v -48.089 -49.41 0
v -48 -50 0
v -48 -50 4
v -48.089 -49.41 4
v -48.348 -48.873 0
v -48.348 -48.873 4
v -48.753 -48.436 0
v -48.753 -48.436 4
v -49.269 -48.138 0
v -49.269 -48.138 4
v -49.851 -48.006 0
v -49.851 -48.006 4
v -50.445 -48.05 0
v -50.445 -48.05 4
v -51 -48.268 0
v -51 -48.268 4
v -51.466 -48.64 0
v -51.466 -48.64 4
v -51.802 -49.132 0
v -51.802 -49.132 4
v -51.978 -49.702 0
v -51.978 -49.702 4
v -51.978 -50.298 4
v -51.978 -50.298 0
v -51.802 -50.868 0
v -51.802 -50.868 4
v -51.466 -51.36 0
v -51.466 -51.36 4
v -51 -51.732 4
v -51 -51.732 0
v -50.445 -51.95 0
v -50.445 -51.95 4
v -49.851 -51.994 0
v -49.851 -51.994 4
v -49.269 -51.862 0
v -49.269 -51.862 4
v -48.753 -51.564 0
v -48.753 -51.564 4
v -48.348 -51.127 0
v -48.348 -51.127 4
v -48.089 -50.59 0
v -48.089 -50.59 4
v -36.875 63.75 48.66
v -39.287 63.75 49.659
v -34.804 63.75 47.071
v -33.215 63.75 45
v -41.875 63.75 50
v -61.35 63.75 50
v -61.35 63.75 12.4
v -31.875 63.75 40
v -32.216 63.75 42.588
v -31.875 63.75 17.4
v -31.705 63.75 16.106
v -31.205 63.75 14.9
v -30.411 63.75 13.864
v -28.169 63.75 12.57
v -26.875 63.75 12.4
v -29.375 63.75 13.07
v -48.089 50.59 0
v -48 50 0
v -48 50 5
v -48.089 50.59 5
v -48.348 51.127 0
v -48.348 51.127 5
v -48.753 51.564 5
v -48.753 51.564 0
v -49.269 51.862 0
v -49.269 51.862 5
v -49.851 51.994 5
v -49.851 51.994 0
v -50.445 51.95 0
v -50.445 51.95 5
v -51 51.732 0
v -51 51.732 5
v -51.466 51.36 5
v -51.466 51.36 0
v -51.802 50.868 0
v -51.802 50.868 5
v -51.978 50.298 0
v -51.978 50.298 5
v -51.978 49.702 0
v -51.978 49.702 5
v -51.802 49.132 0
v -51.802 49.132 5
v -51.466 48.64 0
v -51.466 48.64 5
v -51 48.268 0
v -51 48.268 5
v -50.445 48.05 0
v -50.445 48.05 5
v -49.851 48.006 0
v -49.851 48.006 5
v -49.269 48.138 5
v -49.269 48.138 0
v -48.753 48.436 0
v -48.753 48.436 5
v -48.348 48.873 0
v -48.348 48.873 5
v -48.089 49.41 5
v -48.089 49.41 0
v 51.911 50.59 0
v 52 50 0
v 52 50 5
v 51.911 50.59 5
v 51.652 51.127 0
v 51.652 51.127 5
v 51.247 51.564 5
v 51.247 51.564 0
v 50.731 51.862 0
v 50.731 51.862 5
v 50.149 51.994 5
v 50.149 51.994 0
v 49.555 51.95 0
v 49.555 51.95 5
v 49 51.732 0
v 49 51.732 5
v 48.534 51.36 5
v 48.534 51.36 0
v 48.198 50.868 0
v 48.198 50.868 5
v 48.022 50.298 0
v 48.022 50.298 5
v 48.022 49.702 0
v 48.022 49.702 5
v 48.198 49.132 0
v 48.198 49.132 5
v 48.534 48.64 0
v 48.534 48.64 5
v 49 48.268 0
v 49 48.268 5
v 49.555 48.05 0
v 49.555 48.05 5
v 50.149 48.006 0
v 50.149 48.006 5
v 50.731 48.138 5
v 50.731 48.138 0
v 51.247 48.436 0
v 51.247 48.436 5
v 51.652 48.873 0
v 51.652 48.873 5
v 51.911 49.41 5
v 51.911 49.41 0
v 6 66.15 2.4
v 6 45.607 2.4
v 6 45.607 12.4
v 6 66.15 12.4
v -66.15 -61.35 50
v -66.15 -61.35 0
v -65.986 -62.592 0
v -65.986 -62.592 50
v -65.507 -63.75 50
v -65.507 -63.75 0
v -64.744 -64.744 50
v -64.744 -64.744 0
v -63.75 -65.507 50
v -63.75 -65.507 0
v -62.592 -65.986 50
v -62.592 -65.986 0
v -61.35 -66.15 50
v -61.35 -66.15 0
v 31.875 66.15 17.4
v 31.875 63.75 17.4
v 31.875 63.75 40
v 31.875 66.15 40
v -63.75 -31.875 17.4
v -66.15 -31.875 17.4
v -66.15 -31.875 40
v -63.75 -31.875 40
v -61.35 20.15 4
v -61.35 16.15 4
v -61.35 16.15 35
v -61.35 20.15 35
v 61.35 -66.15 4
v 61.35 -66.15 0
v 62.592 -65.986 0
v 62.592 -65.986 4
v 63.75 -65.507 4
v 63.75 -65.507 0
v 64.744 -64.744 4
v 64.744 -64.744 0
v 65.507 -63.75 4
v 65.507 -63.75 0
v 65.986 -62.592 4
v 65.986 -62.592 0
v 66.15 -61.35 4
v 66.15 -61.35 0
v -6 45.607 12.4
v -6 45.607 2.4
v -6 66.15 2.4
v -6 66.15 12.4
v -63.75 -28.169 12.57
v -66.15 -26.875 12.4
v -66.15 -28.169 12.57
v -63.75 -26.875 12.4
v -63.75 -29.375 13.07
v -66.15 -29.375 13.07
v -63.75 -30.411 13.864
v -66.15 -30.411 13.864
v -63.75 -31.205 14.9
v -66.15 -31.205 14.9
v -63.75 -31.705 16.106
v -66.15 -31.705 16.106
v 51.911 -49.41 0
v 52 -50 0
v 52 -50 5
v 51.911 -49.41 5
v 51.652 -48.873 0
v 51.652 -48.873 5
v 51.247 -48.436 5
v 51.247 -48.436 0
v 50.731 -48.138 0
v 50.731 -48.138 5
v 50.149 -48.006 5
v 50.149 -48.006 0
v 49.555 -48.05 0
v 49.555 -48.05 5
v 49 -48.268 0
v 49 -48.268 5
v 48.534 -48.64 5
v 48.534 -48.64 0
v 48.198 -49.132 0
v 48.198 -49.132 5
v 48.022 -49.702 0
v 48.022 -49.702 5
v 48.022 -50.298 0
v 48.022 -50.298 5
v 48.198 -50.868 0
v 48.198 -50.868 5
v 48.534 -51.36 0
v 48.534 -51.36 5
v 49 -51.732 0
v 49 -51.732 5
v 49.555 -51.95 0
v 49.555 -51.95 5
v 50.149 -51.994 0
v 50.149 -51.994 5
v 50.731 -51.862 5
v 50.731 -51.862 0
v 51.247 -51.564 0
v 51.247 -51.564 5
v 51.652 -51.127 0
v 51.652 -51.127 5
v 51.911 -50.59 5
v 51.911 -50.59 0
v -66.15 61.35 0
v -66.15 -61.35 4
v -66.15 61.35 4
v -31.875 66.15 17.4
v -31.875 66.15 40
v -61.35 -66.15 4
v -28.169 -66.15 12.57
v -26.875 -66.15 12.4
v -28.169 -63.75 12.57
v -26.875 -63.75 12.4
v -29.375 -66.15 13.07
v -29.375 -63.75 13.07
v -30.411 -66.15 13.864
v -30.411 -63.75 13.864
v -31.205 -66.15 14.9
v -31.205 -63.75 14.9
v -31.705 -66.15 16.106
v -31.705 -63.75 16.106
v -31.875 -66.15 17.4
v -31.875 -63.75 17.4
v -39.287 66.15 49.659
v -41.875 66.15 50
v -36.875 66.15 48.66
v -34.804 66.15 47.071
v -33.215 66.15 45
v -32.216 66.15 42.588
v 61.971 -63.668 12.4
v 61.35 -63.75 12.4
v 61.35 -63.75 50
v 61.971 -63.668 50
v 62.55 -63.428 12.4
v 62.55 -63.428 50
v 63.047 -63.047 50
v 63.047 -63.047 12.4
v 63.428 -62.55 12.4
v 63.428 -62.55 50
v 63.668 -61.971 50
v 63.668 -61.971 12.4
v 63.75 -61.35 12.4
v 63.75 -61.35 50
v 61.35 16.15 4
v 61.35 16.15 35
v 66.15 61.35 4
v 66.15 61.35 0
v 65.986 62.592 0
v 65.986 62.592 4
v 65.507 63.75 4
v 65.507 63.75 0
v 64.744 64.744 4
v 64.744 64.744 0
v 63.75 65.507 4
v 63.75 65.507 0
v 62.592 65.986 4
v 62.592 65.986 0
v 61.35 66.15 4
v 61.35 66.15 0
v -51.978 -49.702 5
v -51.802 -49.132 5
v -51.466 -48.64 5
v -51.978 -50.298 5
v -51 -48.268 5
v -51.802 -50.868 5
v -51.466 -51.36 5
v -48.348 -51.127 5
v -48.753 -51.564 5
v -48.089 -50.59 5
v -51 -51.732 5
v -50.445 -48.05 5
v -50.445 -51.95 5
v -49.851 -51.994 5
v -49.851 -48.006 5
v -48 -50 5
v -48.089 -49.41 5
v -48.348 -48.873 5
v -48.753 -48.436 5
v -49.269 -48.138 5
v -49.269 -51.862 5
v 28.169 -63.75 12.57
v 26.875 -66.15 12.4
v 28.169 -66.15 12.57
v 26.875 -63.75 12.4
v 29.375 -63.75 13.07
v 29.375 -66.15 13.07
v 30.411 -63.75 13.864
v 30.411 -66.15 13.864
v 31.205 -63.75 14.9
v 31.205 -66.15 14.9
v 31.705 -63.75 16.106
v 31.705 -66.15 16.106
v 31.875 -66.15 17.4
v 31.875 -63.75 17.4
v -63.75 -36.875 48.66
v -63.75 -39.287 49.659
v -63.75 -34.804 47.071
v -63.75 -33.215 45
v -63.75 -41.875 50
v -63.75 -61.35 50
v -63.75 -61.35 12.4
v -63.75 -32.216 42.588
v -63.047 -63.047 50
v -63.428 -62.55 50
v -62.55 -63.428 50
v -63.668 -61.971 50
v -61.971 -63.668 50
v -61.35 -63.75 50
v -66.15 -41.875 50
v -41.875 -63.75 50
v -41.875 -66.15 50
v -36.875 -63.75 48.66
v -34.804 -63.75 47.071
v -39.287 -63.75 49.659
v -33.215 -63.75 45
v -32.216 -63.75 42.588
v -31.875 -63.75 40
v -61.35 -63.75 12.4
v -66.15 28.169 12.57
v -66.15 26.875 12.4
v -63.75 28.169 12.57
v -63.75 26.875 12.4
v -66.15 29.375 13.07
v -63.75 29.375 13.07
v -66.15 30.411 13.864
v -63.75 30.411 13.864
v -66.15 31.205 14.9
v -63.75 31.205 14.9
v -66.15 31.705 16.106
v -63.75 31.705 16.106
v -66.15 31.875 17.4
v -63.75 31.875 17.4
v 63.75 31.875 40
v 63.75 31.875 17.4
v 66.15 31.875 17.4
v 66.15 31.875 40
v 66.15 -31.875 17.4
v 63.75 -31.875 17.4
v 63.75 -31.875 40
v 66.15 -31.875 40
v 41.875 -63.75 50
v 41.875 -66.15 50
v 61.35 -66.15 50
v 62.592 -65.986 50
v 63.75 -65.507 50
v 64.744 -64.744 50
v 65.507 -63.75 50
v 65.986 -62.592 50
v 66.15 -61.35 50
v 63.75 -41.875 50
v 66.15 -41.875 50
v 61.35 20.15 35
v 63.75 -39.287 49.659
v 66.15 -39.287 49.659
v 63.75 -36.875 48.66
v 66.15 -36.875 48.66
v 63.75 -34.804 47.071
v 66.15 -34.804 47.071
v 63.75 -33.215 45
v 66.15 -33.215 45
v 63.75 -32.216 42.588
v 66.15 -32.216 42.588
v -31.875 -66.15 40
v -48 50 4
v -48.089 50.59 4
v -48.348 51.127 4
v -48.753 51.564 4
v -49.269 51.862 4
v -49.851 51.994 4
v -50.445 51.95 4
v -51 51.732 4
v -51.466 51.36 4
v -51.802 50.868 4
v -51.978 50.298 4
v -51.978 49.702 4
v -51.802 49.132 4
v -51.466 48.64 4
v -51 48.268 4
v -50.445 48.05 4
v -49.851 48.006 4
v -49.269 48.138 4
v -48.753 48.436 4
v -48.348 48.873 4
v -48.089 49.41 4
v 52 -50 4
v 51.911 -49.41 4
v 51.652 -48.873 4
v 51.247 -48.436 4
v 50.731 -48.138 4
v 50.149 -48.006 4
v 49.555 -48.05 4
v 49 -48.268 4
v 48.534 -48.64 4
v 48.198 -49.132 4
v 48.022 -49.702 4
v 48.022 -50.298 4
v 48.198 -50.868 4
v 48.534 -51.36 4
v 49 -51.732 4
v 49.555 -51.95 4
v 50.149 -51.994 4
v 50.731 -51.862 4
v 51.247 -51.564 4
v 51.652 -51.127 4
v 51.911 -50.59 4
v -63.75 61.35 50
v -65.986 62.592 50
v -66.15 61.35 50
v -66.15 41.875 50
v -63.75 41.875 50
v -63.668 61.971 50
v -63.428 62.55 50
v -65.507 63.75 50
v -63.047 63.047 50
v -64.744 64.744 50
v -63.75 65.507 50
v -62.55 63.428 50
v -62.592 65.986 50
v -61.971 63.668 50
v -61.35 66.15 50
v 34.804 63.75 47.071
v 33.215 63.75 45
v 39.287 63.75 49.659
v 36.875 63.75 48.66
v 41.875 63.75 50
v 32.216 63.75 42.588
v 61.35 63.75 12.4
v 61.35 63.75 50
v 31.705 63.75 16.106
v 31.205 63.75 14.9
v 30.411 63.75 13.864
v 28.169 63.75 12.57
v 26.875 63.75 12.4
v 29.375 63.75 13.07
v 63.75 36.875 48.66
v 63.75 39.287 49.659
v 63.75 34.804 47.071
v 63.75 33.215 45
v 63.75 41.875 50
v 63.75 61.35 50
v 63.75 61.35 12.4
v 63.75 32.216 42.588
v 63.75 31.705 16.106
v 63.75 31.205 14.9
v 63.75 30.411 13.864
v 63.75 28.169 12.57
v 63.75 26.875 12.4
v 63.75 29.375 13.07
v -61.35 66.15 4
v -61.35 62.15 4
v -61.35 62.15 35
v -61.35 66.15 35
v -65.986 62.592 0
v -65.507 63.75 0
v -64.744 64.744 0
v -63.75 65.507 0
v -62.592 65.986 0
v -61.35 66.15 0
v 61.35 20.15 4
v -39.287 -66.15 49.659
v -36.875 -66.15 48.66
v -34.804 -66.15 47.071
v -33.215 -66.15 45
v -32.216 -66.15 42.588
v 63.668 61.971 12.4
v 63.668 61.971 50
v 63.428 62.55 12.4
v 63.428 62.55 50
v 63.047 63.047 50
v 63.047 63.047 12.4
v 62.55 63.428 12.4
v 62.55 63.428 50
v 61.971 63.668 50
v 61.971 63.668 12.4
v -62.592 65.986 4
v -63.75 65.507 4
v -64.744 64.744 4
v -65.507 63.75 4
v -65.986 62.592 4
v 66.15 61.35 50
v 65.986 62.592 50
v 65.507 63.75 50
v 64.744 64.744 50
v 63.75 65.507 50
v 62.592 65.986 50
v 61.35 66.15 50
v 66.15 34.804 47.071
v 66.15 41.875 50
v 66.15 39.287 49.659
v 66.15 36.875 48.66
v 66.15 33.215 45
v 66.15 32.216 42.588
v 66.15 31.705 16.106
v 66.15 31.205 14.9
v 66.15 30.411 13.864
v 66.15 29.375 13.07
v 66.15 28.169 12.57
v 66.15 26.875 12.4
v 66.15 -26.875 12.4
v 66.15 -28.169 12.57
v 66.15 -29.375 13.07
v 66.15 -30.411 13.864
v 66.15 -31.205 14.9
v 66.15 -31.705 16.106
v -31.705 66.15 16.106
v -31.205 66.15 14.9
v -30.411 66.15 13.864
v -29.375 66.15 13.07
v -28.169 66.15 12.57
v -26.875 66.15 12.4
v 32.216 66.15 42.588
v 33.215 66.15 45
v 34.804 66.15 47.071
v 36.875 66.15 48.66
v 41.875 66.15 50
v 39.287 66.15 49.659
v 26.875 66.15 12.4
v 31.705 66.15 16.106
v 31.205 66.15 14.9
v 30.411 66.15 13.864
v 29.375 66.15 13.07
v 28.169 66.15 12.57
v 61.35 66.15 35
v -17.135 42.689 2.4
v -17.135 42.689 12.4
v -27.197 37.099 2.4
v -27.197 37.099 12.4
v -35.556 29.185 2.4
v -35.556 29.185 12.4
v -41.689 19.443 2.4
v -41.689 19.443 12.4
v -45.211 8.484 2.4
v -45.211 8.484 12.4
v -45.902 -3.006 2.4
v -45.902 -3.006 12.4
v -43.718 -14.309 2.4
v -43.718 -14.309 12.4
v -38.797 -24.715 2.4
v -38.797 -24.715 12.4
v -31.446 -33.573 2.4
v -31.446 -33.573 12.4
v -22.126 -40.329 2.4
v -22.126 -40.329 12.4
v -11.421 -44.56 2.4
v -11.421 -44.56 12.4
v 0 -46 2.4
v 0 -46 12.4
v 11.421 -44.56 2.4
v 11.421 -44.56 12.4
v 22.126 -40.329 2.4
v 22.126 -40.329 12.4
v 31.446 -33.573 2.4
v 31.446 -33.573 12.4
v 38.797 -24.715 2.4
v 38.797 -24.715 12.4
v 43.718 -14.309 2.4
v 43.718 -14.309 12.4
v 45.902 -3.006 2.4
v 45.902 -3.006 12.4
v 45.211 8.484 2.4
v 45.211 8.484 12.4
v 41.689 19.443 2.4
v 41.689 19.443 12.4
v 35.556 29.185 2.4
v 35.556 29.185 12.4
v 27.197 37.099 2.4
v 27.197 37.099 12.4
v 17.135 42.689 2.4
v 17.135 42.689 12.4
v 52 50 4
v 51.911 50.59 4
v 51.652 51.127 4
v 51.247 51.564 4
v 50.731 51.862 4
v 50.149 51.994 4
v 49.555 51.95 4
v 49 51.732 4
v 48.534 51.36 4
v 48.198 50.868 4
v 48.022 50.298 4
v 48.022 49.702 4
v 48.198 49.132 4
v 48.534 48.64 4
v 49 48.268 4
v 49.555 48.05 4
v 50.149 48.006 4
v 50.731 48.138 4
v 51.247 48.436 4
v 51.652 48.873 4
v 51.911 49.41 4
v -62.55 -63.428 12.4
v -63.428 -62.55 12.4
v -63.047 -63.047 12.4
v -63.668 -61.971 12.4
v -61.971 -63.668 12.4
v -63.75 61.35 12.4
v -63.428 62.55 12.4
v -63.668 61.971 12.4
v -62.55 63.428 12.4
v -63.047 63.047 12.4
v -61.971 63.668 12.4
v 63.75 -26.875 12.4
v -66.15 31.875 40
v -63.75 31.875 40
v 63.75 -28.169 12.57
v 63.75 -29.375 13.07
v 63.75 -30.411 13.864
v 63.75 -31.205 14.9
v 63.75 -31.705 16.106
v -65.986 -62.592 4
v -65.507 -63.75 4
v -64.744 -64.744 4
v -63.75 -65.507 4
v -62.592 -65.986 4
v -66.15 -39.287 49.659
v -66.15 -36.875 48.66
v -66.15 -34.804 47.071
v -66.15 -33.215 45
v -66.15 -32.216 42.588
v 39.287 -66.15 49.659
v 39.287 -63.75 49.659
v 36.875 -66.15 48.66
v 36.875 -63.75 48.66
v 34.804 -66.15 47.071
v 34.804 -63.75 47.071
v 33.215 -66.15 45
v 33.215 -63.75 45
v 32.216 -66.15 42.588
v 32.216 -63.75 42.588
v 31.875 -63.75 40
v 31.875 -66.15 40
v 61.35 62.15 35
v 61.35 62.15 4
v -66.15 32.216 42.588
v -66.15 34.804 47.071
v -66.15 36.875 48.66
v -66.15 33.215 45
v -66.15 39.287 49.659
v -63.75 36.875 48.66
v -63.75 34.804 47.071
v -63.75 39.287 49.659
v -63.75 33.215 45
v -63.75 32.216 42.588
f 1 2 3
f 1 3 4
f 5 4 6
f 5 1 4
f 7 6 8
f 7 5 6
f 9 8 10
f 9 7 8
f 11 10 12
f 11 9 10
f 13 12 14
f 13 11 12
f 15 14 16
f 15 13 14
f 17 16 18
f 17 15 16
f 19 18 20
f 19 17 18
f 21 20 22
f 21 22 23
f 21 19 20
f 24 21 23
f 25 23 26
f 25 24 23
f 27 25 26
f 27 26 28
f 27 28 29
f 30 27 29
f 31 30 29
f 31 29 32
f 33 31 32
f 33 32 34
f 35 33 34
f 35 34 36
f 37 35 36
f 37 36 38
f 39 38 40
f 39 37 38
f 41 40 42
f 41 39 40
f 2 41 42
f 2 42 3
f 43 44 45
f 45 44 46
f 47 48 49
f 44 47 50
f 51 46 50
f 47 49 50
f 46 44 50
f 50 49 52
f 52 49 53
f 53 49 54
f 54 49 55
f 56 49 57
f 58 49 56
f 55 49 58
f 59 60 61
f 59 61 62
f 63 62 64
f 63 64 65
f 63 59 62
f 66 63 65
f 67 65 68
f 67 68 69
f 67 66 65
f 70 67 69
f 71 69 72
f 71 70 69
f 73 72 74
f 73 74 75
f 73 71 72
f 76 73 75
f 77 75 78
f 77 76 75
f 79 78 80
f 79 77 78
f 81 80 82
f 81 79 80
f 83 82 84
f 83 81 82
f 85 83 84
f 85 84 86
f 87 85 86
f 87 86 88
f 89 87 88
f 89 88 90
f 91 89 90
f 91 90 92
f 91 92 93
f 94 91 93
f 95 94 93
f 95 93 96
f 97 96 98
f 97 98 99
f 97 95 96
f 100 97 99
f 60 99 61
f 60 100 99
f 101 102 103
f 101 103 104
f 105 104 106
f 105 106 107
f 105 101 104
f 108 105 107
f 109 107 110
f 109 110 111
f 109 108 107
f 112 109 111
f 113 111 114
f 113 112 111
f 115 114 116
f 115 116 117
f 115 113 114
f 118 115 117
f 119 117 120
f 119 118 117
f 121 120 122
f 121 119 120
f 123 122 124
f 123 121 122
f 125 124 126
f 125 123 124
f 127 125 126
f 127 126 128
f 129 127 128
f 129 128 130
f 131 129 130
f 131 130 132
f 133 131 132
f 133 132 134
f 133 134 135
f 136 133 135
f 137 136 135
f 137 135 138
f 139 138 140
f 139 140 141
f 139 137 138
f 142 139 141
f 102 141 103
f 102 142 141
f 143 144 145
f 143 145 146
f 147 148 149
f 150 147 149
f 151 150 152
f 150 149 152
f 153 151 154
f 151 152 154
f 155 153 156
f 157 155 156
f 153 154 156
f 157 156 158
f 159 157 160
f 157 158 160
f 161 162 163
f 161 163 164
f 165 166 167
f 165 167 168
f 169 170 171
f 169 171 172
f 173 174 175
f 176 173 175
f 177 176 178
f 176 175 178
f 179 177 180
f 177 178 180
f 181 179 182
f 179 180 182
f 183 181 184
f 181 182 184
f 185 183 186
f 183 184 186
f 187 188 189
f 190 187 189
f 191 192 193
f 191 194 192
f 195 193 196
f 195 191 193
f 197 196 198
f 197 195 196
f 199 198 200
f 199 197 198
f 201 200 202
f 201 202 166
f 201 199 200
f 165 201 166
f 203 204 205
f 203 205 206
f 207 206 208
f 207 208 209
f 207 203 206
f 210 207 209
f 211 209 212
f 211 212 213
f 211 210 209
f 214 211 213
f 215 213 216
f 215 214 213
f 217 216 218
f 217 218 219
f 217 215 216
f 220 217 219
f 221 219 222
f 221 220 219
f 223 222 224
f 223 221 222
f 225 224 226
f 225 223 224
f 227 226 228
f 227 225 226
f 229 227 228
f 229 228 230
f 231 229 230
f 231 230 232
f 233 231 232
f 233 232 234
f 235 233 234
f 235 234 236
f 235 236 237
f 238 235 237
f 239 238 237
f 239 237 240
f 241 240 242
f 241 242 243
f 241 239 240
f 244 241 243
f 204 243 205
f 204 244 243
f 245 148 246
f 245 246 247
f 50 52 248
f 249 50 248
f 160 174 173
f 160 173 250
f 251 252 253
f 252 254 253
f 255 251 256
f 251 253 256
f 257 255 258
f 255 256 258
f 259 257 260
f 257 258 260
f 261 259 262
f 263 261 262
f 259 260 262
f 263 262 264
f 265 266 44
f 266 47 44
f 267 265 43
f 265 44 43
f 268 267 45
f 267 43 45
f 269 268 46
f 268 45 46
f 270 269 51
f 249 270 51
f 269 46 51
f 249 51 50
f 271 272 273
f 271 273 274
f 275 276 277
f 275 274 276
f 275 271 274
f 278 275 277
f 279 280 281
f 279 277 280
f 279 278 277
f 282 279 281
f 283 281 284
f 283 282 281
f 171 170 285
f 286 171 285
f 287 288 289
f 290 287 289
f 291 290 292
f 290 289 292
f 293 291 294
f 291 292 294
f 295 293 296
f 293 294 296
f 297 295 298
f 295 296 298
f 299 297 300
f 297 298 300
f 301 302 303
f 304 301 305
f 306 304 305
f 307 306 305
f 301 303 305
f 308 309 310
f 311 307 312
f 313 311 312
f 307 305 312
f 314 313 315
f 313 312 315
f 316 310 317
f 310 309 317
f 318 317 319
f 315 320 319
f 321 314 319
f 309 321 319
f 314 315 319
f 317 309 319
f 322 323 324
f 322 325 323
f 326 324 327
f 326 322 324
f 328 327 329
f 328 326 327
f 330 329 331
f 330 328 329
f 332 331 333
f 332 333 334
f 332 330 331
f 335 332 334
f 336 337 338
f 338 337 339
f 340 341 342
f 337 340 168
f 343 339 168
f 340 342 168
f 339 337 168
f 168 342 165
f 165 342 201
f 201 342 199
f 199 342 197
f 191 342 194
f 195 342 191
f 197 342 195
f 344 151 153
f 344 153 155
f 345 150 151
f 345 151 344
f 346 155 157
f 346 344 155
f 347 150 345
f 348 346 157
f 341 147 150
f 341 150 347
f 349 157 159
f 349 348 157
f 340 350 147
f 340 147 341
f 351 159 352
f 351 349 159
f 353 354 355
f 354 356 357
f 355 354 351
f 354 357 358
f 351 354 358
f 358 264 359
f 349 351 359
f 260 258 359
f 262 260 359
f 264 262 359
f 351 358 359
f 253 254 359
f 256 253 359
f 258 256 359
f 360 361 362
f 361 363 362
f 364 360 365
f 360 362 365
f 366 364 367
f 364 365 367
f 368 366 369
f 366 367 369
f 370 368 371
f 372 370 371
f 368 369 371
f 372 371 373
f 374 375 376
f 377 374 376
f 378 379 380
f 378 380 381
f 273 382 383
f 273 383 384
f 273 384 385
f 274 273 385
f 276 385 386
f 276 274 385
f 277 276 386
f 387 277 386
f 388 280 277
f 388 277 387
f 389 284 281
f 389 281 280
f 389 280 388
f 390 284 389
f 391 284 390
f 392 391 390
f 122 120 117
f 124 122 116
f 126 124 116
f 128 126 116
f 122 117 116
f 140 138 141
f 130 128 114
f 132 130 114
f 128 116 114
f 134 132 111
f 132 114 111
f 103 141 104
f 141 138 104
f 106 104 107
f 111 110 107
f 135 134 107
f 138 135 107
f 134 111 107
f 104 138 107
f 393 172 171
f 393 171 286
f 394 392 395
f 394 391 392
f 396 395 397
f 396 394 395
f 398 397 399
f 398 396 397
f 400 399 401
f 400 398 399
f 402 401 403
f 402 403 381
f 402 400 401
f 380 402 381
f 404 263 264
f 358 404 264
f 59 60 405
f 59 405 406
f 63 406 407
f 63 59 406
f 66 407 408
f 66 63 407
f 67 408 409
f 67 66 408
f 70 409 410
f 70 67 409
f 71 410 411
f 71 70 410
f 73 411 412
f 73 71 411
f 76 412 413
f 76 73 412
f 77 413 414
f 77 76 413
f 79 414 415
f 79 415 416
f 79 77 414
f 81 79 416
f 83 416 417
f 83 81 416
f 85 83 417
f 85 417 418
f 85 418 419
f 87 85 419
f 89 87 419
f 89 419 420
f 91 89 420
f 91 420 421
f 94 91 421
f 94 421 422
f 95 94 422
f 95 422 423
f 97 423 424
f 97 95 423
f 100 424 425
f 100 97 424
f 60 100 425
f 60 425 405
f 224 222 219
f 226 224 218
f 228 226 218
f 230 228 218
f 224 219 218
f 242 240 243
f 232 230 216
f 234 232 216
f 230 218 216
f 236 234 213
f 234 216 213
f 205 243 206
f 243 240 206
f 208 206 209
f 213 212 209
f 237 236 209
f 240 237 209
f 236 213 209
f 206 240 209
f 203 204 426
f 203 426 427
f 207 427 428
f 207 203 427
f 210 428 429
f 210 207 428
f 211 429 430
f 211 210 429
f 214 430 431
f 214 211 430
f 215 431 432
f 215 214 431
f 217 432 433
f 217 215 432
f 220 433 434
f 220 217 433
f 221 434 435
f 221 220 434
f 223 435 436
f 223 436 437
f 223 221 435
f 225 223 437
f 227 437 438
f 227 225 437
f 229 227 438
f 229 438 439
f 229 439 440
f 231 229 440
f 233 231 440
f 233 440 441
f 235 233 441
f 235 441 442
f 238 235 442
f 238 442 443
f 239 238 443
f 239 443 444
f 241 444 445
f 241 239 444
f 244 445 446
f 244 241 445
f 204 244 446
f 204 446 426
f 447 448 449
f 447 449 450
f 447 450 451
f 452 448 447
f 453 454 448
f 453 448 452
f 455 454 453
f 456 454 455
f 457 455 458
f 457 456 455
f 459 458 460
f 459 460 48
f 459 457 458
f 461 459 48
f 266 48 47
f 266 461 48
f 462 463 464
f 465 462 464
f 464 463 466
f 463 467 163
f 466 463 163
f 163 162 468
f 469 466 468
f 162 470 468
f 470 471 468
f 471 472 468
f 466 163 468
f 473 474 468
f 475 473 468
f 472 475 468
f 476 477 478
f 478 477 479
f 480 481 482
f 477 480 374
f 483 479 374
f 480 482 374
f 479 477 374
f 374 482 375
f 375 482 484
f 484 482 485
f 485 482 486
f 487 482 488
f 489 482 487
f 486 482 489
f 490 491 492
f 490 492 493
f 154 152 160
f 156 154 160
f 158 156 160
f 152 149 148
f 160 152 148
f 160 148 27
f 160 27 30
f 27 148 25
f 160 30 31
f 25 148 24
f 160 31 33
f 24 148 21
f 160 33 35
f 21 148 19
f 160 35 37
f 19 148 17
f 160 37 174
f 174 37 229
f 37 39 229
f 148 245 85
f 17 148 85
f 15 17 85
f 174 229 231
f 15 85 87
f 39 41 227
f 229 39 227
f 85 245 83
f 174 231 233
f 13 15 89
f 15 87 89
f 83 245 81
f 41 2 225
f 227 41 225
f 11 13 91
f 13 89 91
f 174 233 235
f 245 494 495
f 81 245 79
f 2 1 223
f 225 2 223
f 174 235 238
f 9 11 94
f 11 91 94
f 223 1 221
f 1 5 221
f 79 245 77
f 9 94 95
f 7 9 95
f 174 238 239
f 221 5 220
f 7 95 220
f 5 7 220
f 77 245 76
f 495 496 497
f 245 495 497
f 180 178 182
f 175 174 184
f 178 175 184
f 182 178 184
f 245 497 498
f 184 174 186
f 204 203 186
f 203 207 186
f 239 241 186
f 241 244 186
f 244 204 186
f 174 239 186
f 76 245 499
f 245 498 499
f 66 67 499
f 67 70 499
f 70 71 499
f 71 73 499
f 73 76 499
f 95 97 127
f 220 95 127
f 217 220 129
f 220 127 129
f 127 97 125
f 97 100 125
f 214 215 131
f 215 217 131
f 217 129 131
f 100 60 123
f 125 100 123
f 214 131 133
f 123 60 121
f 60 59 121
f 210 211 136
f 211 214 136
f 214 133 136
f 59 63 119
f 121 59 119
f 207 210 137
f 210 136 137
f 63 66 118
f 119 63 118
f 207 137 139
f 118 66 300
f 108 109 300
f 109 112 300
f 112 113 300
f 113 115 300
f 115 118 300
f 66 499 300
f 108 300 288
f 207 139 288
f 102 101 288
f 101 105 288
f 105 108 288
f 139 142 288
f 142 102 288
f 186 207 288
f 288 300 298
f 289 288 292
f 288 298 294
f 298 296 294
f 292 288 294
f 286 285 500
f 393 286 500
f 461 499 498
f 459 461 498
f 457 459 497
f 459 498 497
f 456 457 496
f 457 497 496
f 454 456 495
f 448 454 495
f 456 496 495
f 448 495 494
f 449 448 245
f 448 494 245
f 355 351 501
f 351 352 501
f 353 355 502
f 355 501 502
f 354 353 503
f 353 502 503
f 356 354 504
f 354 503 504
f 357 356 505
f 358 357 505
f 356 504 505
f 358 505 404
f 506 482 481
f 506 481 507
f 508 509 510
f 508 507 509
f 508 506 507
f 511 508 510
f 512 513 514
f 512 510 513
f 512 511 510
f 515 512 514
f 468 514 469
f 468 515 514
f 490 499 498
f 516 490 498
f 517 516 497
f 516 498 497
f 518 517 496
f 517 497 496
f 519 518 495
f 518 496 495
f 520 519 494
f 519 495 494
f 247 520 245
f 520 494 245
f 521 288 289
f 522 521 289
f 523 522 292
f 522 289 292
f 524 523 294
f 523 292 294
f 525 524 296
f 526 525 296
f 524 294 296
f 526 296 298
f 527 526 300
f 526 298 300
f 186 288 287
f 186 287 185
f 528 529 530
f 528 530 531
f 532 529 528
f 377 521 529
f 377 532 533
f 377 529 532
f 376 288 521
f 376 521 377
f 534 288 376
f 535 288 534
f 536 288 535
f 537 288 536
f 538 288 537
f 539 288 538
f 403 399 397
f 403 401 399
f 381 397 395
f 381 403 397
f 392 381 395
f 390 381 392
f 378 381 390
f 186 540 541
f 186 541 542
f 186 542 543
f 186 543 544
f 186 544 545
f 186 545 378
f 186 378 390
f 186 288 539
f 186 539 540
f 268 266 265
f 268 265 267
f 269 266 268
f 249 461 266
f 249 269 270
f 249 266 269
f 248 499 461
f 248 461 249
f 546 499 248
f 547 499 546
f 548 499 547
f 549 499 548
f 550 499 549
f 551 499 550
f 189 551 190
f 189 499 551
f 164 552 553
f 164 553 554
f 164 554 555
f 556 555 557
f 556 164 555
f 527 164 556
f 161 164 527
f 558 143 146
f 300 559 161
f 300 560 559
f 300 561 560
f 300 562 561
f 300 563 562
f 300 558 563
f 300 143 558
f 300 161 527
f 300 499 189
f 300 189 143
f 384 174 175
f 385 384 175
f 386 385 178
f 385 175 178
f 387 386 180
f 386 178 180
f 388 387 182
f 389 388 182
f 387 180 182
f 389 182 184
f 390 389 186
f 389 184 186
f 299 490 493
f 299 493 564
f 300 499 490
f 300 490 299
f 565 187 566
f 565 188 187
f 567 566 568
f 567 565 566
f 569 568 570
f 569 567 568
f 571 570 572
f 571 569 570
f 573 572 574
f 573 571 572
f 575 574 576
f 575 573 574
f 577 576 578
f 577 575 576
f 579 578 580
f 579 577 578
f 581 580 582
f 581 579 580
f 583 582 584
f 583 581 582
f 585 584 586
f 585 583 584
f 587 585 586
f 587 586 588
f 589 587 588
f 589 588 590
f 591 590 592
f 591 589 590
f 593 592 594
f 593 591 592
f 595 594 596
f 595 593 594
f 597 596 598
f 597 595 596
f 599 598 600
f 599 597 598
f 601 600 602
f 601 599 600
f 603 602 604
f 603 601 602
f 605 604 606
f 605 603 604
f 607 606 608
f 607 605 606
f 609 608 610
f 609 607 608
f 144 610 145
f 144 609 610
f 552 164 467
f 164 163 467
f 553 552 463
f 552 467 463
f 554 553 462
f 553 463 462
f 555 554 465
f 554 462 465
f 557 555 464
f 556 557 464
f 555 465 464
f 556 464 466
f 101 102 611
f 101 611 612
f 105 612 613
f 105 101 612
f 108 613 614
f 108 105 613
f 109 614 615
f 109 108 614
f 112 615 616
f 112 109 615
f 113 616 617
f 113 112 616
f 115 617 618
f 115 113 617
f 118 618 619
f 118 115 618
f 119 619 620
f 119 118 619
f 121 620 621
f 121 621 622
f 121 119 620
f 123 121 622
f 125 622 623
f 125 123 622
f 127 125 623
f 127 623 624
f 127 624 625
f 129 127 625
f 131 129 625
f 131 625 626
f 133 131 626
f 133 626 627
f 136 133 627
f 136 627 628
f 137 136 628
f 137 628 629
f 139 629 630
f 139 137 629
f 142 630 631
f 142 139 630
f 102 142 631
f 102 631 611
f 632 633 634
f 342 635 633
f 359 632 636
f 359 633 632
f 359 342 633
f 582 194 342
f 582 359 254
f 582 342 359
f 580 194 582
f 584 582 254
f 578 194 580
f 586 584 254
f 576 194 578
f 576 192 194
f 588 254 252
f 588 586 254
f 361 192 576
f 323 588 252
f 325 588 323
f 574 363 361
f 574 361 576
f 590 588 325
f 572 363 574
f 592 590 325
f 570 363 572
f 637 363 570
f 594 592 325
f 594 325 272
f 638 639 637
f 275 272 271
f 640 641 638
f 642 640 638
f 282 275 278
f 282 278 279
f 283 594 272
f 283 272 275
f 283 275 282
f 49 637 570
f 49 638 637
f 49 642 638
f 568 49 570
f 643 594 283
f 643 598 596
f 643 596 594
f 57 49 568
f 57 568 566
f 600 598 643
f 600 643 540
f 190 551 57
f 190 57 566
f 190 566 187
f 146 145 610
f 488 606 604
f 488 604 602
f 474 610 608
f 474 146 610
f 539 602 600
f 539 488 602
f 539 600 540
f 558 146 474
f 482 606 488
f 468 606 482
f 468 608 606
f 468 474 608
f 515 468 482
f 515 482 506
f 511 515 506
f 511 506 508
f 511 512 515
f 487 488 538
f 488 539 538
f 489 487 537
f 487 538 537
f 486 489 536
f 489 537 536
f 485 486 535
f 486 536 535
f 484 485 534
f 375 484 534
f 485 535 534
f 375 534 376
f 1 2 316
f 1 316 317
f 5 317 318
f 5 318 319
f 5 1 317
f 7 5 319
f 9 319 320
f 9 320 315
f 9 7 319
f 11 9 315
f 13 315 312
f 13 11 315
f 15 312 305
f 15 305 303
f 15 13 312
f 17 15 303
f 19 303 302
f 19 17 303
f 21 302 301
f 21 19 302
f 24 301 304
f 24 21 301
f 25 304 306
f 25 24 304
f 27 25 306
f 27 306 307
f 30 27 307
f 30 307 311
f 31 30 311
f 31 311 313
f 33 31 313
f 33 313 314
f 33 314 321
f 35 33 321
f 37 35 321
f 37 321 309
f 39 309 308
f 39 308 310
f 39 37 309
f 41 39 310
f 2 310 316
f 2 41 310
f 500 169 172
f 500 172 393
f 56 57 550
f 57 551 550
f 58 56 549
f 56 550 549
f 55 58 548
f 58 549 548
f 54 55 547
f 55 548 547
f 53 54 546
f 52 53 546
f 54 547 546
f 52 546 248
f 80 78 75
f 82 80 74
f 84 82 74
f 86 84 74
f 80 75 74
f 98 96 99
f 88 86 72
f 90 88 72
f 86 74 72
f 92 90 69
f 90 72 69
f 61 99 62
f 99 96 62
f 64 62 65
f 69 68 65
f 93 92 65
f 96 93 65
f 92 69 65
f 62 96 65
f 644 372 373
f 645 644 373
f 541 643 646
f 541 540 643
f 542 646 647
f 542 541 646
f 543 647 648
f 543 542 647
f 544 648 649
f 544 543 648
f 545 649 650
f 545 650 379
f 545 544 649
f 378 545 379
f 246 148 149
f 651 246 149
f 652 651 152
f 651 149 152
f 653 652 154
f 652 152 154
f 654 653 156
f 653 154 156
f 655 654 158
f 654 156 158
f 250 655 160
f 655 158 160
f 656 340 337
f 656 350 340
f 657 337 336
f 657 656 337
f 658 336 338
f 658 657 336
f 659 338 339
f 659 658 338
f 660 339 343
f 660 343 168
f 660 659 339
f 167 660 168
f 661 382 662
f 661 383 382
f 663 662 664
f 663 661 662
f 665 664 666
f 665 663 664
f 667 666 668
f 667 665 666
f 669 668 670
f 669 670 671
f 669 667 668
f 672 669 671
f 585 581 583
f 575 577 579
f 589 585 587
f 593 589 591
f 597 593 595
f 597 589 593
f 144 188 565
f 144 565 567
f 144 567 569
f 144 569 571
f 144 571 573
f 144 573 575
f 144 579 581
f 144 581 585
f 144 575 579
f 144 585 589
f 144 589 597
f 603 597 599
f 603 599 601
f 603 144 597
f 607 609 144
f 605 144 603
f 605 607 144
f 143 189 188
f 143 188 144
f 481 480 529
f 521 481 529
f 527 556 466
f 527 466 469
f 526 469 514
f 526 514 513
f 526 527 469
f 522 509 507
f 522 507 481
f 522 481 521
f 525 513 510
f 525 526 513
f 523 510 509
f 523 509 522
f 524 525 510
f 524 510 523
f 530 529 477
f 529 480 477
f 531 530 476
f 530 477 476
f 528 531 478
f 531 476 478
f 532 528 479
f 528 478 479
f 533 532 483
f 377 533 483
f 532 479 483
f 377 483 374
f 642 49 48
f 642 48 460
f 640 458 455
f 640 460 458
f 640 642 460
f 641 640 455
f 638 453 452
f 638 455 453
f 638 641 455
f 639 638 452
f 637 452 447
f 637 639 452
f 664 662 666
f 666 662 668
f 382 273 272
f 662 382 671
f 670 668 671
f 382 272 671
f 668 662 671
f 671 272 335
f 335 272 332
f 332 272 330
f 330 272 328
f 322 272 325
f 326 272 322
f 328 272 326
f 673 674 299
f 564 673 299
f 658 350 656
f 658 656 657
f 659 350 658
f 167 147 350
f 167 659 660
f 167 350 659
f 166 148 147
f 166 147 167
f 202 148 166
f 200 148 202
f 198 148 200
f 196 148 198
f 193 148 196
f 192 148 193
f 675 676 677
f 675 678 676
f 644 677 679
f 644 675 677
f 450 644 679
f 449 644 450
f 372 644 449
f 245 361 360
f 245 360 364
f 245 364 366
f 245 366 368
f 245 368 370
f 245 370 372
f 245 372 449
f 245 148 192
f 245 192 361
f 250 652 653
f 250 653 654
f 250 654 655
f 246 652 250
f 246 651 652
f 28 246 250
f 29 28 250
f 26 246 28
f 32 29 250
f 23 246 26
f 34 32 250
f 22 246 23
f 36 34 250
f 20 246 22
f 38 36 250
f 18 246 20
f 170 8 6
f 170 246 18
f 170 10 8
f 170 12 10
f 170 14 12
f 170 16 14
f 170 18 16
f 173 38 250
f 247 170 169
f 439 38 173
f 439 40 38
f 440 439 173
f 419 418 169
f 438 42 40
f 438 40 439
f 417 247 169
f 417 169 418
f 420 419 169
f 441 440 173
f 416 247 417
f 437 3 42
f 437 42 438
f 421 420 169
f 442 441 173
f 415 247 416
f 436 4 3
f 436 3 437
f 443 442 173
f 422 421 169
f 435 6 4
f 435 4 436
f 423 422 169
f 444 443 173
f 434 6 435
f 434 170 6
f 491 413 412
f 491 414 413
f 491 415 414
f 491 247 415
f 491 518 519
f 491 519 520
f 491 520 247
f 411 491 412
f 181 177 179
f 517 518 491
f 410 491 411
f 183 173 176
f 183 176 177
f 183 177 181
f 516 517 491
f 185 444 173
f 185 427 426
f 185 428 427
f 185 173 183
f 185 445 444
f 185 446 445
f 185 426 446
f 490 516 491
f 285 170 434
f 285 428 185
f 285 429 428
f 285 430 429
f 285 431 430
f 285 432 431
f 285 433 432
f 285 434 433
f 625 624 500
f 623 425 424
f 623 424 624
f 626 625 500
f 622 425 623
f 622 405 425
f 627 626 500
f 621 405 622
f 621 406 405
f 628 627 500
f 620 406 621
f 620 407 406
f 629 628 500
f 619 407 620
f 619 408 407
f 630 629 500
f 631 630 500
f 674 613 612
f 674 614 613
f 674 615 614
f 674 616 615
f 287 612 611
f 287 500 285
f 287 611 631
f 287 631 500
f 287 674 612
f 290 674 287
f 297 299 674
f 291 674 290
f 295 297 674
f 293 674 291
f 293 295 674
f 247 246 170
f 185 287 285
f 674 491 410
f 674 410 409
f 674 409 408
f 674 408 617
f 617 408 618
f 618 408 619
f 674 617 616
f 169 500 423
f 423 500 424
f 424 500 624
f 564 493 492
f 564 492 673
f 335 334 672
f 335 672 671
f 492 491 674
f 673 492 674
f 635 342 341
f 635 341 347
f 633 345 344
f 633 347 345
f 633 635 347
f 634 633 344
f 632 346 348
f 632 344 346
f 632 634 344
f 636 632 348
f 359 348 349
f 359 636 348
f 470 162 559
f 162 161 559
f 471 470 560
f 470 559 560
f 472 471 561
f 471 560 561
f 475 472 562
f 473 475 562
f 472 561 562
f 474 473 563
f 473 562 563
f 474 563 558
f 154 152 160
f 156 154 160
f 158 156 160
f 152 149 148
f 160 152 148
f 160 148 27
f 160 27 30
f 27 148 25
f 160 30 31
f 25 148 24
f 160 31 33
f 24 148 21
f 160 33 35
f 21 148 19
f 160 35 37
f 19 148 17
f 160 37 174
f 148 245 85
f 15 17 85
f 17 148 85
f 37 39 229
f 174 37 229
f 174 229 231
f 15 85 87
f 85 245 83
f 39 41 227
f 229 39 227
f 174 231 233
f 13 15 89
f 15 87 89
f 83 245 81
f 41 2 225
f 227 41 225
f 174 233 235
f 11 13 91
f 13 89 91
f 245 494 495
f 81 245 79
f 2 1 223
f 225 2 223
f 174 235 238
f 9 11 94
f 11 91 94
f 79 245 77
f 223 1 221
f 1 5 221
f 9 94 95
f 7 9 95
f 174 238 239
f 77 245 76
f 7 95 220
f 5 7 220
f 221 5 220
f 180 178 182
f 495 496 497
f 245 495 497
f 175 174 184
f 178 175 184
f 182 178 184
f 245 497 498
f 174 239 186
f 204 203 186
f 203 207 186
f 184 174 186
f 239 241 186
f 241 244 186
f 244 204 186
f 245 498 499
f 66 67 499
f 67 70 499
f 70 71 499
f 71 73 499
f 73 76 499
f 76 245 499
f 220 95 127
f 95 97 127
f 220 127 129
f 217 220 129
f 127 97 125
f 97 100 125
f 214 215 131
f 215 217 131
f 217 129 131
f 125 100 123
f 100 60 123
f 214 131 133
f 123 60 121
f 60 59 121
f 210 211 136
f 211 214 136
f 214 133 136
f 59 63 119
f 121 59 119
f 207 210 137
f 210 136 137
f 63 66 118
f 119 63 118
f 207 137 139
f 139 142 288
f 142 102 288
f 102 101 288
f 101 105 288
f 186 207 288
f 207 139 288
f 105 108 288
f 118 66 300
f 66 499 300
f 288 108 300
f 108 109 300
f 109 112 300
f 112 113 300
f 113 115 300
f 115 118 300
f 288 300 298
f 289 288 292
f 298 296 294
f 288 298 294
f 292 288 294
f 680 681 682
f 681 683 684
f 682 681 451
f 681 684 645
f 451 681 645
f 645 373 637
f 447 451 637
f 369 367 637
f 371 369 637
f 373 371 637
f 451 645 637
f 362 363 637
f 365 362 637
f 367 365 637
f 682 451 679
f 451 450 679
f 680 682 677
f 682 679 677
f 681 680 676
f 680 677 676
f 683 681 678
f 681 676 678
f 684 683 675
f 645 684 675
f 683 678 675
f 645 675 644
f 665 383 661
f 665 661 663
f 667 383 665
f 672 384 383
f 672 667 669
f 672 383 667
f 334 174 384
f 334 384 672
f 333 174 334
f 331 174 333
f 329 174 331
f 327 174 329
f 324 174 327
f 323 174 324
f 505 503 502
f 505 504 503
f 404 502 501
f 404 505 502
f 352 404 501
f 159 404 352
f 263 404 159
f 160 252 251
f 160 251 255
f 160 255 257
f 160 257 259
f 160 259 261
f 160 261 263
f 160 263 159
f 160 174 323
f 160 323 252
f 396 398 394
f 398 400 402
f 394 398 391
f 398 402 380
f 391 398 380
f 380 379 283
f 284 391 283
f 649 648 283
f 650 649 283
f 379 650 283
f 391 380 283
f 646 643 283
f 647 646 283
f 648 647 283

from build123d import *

# Parameters (mm, degrees)
PAD_DEPTH       = 50
SKETCH001_R     = 46
POCKET_DEPTH    = 47.601
SKETCH002_W     = 12
SKETCH002_H     = 66.15
POCKET001_DEPTH = 47.601
POCKET002_DEPTH = 37.601
SKETCH004_R     = 2
POCKET003_DEPTH = 5
SKETCH007_W     = 153
SKETCH007_H     = 63.75
POCKET004_DEPTH = 37.601
SKETCH008_W     = 63.75
SKETCH008_H     = 153
POCKET005_DEPTH = 37.601
FILLET_R        = 10
FILLET001_R     = 5
SKETCH005_R     = 2
PAD001_DEPTH    = 4
SKETCH006_W     = 122.7
SKETCH006_H     = 4
PAD002_DEPTH    = 35


with BuildPart() as box_holder:
    # Sketch → Pad (new body)
    with BuildSketch(Plane.XY):
        with BuildLine():
            ThreePointArc((-61.35, 66.15), (-64.744113, 64.744113), (-66.15, 61.35))
            Line((-66.15, -61.35), (-66.15, 61.35))
            ThreePointArc((-66.15, -61.35), (-64.744113, -64.744113), (-61.35, -66.15))
            Line((61.35, -66.15), (-61.35, -66.15))
            ThreePointArc((61.35, -66.15), (64.744113, -64.744113), (66.15, -61.35))
            Line((66.15, 61.35), (66.15, -61.35))
            ThreePointArc((66.15, 61.35), (64.744113, 64.744113), (61.35, 66.15))
            Line((-61.35, 66.15), (61.35, 66.15))
        make_face()
    extrude(amount=PAD_DEPTH)

    # Sketch001 → Pocket (cut, through all)
    with BuildSketch(Plane.XY.offset(2.4)):
        Circle(SKETCH001_R)
    extrude(amount=POCKET_DEPTH, mode=Mode.SUBTRACT)

    # Sketch002 → Pocket001 (cut, through all)
    with BuildSketch(Plane.XY.offset(2.4)):
        with Locations((0, 33.075)):
            Rectangle(SKETCH002_W, SKETCH002_H)
    extrude(amount=POCKET001_DEPTH, mode=Mode.SUBTRACT)

    # Sketch003 → Pocket002 (cut, through all)
    with BuildSketch(Plane.XY.offset(12.4)):
        with BuildLine():
            ThreePointArc((-61.35, 63.75), (-63.047056, 63.047056), (-63.75, 61.35))
            Line((-63.75, -61.35), (-63.75, 61.35))
            ThreePointArc((-63.75, -61.35), (-63.047056, -63.047056), (-61.35, -63.75))
            Line((61.35, -63.75), (-61.35, -63.75))
            ThreePointArc((61.35, -63.75), (63.047056, -63.047056), (63.75, -61.35))
            Line((63.75, 61.35), (63.75, -61.35))
            ThreePointArc((63.75, 61.35), (63.047056, 63.047056), (61.35, 63.75))
            Line((-61.35, 63.75), (61.35, 63.75))
        make_face()
    extrude(amount=POCKET002_DEPTH, mode=Mode.SUBTRACT)

    # Sketch004 → Pocket003 (cut)
    with BuildSketch(Plane.XY):
        with Locations((-50, 50)):
            Circle(SKETCH004_R)
        with Locations((50, 50)):
            Circle(SKETCH004_R)
        with Locations((50, -50)):
            Circle(SKETCH004_R)
        with Locations((-50, -50)):
            Circle(SKETCH004_R)
    extrude(amount=POCKET003_DEPTH, mode=Mode.SUBTRACT)

    # Sketch007 → Pocket004 (cut, through all)
    with BuildSketch(Plane.XY.offset(12.4)):
        Rectangle(SKETCH007_W, SKETCH007_H)
    extrude(amount=POCKET004_DEPTH, mode=Mode.SUBTRACT)

    # Sketch008 → Pocket005 (cut, through all)
    with BuildSketch(Plane.XY.offset(12.4)):
        Rectangle(SKETCH008_W, SKETCH008_H)
    extrude(amount=POCKET005_DEPTH, mode=Mode.SUBTRACT)

    # Fillet
    fillet_edges = [box_holder.edges().sort_by_distance(p)[0] for p in [
        (-64.95, -31.875, 50),
        (-64.95, 31.875, 50),
        (-31.875, -64.95, 50),
        (31.875, -64.95, 50),
        (64.95, -31.875, 50),
        (64.95, 31.875, 50),
        (31.875, 64.95, 50),
        (-31.875, 64.95, 50),
    ]]
    fillet(fillet_edges, radius=FILLET_R)

    # Fillet001
    fillet001_edges = [box_holder.edges().sort_by_distance(p)[0] for p in [
        (31.875, 64.95, 12.4),
        (64.95, 31.875, 12.4),
        (-31.875, 64.95, 12.4),
        (-64.95, -31.875, 12.4),
        (-64.95, 31.875, 12.4),
        (-31.875, -64.95, 12.4),
        (31.875, -64.95, 12.4),
        (64.95, -31.875, 12.4),
    ]]
    fillet(fillet001_edges, radius=FILLET001_R)


with BuildPart() as bed_attachement:
    # Sketch005 → Pad001 (new body)
    with BuildSketch(Plane.XY):
        with BuildLine():
            ThreePointArc((-61.35, 66.15), (-64.744113, 64.744113), (-66.15, 61.35))
            Line((-66.15, -61.35), (-66.15, 61.35))
            ThreePointArc((-66.15, -61.35), (-64.744113, -64.744113), (-61.35, -66.15))
            Line((61.35, -66.15), (-61.35, -66.15))
            ThreePointArc((61.35, -66.15), (64.744113, -64.744113), (66.15, -61.35))
            Line((66.15, 61.35), (66.15, -61.35))
            ThreePointArc((66.15, 61.35), (64.744113, 64.744113), (61.35, 66.15))
            Line((-61.35, 66.15), (61.35, 66.15))
        make_face()
        with Locations((-50, 50)):
            Circle(SKETCH005_R, mode=Mode.SUBTRACT)
        with Locations((50, 50)):
            Circle(SKETCH005_R, mode=Mode.SUBTRACT)
        with Locations((-50, -50)):
            Circle(SKETCH005_R, mode=Mode.SUBTRACT)
        with Locations((50, -50)):
            Circle(SKETCH005_R, mode=Mode.SUBTRACT)
    extrude(amount=PAD001_DEPTH)

    # Sketch006 → Pad002 (join)
    with BuildSketch(Plane.XY):
        with Locations((0, 64.15)):
            Rectangle(SKETCH006_W, SKETCH006_H)
        with Locations((0, 18.15)):
            Rectangle(SKETCH006_W, SKETCH006_H)
    extrude(amount=PAD002_DEPTH)


solid = Compound([box_holder.part, bed_attachement.part])
